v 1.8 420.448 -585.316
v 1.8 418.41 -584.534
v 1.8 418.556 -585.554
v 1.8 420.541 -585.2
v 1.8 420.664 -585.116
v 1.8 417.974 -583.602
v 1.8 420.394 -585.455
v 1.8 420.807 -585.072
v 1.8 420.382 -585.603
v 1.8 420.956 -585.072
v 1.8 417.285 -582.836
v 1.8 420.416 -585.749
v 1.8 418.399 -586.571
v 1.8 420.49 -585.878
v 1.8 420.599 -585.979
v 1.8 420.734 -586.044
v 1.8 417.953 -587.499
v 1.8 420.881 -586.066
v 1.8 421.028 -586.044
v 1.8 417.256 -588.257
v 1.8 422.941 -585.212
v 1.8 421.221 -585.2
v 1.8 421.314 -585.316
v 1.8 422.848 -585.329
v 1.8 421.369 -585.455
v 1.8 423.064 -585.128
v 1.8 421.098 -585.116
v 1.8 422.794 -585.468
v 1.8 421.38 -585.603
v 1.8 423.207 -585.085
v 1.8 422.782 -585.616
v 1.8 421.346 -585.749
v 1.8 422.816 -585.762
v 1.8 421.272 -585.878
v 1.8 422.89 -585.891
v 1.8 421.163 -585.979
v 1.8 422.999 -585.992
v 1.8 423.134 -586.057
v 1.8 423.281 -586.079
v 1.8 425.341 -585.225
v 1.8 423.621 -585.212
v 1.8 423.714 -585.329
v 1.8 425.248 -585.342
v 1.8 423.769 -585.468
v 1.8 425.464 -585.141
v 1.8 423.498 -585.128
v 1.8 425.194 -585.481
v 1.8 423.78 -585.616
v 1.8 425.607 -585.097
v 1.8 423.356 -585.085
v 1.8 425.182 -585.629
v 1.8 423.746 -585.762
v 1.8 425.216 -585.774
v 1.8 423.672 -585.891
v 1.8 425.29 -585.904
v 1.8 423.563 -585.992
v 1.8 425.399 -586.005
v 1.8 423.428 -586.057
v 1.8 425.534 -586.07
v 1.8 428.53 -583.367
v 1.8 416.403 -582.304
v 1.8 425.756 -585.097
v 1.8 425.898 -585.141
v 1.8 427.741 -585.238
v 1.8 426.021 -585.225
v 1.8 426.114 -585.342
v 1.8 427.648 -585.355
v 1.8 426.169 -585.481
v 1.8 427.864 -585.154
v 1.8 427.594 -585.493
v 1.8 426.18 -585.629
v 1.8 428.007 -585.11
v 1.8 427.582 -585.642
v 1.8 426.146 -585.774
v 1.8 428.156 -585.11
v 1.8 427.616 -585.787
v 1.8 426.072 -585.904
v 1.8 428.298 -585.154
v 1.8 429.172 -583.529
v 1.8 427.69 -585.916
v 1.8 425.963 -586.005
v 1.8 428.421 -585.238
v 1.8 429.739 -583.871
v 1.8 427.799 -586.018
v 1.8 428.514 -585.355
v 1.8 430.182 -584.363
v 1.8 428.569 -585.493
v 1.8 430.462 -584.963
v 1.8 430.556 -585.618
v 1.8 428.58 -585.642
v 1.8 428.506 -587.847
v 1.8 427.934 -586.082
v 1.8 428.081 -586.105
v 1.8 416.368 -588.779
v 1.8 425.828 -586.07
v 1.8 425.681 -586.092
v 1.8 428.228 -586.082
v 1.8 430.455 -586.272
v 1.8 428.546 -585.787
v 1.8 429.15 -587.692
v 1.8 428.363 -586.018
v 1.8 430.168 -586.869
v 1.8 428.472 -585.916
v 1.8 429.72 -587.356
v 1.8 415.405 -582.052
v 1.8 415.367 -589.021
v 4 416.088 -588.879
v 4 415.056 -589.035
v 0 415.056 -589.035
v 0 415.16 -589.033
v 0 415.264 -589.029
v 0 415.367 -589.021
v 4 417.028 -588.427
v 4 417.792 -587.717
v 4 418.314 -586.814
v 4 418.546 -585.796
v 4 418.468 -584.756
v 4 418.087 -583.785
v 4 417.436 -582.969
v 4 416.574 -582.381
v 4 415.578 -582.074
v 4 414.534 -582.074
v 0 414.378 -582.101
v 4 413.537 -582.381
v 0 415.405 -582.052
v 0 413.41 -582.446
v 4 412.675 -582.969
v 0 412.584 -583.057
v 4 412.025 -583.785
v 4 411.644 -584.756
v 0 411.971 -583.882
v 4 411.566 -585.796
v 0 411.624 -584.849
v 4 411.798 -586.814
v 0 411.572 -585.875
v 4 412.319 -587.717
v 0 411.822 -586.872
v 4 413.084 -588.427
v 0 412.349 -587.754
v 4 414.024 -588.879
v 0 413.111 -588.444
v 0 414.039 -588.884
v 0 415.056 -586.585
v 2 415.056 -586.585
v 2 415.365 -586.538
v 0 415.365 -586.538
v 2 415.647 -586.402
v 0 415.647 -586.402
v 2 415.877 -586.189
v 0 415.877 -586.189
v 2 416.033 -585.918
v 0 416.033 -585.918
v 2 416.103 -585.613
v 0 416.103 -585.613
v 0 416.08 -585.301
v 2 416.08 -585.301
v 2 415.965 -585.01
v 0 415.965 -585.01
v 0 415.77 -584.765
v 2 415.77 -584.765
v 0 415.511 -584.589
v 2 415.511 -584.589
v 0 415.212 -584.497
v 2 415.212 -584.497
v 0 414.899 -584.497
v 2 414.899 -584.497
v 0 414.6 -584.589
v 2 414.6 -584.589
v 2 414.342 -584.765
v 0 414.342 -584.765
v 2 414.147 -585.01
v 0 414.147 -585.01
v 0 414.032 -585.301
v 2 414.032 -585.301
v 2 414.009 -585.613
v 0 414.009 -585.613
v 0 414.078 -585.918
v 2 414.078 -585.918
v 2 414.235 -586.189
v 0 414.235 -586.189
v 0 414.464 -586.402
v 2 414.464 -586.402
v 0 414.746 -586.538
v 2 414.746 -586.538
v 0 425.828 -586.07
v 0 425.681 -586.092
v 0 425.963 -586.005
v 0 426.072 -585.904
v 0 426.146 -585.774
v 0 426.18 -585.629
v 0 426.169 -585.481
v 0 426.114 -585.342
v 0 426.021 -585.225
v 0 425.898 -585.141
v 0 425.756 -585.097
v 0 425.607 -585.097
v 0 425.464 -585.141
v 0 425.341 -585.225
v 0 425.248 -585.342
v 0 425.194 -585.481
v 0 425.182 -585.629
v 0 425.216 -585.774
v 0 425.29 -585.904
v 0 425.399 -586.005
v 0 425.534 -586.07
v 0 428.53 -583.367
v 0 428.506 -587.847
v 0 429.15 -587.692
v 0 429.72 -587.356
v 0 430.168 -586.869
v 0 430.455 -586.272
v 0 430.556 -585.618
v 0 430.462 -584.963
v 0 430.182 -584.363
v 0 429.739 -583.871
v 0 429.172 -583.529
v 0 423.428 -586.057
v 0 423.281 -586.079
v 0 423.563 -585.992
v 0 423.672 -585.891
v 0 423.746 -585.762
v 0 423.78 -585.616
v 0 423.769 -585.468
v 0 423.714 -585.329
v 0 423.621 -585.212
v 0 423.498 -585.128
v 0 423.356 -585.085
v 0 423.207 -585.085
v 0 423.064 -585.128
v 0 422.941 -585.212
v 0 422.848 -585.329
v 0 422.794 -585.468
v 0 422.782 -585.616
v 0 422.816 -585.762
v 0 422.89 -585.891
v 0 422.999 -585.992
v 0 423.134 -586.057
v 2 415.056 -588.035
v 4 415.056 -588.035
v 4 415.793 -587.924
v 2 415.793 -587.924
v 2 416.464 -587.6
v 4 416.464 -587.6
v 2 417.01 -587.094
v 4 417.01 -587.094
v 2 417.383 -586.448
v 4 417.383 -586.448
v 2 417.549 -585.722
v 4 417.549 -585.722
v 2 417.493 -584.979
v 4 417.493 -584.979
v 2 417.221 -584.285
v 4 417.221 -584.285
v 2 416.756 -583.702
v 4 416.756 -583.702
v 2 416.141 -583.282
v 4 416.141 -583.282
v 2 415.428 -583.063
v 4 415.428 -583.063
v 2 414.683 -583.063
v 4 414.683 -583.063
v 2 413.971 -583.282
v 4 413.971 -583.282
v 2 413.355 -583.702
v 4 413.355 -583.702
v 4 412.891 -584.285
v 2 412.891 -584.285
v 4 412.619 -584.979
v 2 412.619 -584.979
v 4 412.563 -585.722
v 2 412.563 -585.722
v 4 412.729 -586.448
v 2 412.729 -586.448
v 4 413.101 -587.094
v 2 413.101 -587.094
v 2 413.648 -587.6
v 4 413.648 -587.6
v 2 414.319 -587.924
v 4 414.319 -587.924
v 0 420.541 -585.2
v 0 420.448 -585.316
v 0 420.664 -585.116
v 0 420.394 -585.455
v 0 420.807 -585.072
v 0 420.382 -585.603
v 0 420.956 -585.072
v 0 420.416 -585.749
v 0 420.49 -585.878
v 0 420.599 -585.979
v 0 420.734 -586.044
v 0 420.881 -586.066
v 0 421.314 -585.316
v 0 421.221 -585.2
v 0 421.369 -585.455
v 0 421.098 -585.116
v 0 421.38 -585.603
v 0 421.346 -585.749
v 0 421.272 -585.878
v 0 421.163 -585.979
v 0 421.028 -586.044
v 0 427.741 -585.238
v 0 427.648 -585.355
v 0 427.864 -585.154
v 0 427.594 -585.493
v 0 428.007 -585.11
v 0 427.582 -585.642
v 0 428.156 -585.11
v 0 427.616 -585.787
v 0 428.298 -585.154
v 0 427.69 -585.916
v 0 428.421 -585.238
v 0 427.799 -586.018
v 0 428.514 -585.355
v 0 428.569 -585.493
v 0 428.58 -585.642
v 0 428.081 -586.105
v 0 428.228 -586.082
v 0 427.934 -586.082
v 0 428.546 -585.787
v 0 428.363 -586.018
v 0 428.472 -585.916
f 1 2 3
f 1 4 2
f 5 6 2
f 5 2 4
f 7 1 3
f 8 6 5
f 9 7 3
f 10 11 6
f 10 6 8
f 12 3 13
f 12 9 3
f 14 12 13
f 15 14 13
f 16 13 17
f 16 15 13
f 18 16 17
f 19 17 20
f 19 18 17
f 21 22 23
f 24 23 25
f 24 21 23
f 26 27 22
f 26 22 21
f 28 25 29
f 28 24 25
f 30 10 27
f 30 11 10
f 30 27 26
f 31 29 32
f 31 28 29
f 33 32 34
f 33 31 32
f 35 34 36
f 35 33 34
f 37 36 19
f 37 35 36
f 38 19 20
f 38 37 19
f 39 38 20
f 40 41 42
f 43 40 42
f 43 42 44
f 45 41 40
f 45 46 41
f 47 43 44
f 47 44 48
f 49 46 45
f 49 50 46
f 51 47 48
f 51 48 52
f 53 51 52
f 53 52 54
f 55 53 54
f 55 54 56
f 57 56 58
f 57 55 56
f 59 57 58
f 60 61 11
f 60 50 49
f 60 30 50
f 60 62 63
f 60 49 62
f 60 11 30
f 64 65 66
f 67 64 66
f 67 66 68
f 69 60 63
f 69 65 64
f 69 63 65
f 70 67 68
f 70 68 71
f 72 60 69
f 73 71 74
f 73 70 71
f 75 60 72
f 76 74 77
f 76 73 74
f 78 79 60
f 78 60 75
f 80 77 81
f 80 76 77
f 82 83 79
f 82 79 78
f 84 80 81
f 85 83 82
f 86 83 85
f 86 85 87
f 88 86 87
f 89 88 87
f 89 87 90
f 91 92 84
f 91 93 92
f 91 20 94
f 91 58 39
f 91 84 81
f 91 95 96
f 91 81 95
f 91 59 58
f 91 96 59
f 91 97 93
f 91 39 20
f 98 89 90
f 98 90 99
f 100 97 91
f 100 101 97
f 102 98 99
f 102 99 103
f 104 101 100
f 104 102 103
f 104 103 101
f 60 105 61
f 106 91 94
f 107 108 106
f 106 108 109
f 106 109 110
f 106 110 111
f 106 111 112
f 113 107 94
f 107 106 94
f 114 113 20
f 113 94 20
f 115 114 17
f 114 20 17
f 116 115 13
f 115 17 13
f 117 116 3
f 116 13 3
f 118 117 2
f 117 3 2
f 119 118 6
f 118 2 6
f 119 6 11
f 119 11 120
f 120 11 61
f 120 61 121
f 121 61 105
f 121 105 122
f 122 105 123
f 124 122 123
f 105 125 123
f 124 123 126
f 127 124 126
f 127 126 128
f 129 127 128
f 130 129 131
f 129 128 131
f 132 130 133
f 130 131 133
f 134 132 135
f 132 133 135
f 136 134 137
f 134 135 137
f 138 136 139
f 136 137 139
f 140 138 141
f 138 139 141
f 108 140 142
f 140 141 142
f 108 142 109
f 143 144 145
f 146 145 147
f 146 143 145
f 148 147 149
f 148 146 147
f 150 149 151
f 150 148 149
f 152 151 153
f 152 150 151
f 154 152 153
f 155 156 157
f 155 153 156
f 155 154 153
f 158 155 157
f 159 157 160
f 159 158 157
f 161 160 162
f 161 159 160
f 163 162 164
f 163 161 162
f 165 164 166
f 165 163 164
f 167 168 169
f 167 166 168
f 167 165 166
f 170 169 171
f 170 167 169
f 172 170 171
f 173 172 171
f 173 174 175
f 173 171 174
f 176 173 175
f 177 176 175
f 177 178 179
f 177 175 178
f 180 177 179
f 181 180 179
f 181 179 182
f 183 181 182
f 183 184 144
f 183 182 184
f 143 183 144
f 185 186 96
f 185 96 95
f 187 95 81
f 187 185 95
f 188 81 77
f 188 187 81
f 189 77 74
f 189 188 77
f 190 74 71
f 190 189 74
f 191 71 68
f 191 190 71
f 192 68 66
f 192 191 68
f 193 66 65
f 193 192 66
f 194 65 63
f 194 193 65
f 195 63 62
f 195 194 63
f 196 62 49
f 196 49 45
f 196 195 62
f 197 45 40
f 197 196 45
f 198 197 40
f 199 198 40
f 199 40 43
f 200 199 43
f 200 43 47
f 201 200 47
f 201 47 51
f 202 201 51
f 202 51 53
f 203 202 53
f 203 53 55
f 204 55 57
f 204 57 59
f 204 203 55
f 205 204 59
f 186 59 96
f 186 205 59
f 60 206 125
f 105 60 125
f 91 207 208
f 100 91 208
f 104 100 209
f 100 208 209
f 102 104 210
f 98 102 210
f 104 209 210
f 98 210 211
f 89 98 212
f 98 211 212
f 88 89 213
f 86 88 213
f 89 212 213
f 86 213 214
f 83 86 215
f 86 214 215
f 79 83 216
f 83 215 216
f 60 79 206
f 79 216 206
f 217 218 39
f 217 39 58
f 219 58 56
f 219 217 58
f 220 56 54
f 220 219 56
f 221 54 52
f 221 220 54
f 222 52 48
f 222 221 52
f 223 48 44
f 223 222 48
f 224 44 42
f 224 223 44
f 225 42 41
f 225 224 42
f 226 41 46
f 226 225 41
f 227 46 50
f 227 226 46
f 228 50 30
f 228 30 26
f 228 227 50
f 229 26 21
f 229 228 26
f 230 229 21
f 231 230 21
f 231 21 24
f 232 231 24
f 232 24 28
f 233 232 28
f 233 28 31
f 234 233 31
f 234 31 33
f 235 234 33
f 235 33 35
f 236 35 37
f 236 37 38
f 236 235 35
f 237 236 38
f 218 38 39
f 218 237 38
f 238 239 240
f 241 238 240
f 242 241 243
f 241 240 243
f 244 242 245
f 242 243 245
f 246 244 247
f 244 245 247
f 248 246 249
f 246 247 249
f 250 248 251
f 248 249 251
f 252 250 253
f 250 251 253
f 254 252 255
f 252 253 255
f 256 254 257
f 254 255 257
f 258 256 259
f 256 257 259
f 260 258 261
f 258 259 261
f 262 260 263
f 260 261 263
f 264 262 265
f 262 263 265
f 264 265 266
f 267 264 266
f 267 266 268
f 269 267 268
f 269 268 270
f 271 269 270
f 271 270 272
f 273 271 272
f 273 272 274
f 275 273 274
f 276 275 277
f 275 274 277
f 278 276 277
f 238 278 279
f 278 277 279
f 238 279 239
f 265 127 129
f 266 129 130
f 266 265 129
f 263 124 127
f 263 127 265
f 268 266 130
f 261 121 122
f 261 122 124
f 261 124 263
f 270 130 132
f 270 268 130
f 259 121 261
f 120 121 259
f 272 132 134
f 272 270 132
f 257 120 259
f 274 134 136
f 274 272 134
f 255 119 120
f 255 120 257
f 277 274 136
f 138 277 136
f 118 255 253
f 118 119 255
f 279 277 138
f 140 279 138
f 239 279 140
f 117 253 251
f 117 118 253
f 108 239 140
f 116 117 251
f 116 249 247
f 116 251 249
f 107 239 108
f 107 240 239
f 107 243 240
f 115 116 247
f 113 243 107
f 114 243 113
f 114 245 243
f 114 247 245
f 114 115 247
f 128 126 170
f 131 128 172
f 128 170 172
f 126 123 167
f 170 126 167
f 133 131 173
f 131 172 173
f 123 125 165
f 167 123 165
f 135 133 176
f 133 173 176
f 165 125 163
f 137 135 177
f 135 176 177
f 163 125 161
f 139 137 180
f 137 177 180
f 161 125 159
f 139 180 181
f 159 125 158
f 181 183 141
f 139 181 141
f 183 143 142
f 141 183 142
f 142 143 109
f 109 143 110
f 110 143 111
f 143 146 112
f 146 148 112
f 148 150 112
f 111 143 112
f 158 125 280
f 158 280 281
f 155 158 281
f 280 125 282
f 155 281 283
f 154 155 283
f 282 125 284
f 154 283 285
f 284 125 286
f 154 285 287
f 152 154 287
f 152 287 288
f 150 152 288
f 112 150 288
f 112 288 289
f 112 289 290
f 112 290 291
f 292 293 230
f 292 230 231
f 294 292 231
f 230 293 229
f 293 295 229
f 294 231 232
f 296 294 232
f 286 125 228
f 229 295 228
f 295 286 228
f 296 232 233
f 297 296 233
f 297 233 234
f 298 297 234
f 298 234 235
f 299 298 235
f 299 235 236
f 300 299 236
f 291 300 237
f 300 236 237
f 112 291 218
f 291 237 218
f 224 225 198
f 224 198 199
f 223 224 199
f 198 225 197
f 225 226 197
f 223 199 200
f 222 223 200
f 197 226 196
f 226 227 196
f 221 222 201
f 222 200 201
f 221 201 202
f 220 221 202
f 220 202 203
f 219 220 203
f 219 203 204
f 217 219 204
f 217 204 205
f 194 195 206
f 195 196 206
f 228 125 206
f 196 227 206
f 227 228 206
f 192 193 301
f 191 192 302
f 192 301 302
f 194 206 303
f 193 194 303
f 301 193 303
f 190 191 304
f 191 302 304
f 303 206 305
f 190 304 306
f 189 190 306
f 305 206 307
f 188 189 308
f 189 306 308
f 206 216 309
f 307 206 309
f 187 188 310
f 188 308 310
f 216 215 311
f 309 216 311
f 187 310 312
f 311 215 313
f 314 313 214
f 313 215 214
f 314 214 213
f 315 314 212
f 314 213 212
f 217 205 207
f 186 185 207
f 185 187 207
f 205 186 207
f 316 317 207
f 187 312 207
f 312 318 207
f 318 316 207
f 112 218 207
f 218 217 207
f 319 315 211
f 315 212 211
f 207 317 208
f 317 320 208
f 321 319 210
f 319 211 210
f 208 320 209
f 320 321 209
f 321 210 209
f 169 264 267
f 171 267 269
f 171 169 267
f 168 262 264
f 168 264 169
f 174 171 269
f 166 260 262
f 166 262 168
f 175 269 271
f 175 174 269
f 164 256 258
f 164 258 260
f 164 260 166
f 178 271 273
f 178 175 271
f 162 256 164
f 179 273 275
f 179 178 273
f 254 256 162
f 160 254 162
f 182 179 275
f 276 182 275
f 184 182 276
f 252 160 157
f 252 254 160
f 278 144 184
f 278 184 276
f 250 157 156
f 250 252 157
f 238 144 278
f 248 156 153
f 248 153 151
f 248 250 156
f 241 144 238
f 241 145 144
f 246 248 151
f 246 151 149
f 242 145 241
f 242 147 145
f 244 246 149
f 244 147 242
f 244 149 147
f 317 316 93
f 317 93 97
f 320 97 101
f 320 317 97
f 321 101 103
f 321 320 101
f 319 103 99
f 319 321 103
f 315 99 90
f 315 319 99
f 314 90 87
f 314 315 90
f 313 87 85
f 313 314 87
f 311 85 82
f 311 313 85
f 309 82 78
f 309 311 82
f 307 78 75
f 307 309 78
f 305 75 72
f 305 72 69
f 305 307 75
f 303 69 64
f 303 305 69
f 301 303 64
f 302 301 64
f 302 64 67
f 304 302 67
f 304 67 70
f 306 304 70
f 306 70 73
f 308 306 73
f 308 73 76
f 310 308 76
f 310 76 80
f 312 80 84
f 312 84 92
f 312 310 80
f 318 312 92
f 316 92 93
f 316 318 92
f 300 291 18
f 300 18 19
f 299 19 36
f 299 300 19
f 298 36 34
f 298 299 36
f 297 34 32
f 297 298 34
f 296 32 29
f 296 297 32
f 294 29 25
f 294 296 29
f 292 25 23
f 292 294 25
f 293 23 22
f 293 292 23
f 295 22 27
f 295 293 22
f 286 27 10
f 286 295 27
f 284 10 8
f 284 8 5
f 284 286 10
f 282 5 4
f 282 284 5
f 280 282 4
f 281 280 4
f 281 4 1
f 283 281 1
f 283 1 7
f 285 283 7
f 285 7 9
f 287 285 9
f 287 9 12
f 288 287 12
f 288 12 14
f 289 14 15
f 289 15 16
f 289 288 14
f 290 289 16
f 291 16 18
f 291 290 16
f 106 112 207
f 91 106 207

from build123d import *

# Parameters (mm, degrees)
IZIM1_R                     = 1.05
Y_KSEKLIK_EKSTR_ZYON1_DEPTH = 4
IZIM1_5_R                   = 0.5
Y_KSEKLIK_EKSTR_ZYON2_DEPTH = 1.8
IZIM2_R                     = 2.5
KES_EKSTR_ZYON1_DEPTH       = 2


with BuildPart() as part:
    # Çizim1 → Yükseklik-Ekstrüzyon1 (new body)
    with BuildSketch(Plane(origin=(0, 0, 0), x_dir=(0, 0, -1), z_dir=(1, 0, 0))):
        with BuildLine():
            ThreePointArc((589.020937835, 415.367382833), (585.553599597, 418.555843854), (582.052256525, 415.40476232))
            ThreePointArc((582.052256525, 415.40476232), (585.360174488, 411.560254519), (589.034826128, 415.055894204))
            ThreePointArc((589.034826128, 415.055894204), (589.031352331, 415.211793251), (589.020937835, 415.367382833))
        make_face()
        with Locations((585.534826128, 415.055894204)):
            Circle(IZIM1_R, mode=Mode.SUBTRACT)
    extrude(amount=Y_KSEKLIK_EKSTR_ZYON1_DEPTH)

    # Çizim1<5> → Yükseklik-Ekstrüzyon2 (add)
    with BuildSketch(Plane(origin=(0, 0, 0), x_dir=(0, 0, -1), z_dir=(1, 0, 0))):
        with BuildLine():
            Line((583.367103568, 428.530198932), (582.052256525, 415.40476232))
            ThreePointArc((582.052256525, 415.40476232), (585.553599597, 418.555843854), (589.020937835, 415.367382833))
            Line((589.020937835, 415.367382833), (587.846970124, 428.506169262))
            ThreePointArc((587.846970124, 428.506169262), (585.617966971, 430.555894204), (583.367103568, 428.530198932))
        make_face()
        with Locations((585.566071769, 420.8810388)):
            Circle(IZIM1_5_R, mode=Mode.SUBTRACT)
        with Locations((585.57894519, 423.2810388)):
            Circle(IZIM1_5_R, mode=Mode.SUBTRACT)
        with Locations((585.591818611, 425.6810388)):
            Circle(IZIM1_5_R, mode=Mode.SUBTRACT)
        with Locations((585.604692031, 428.0810388)):
            Circle(IZIM1_5_R, mode=Mode.SUBTRACT)
    extrude(amount=Y_KSEKLIK_EKSTR_ZYON2_DEPTH)

    # Çizim2 → Kes-Ekstrüzyon1 (cut)
    with BuildSketch(Plane(origin=(4, 0, 0), x_dir=(0, 0, -1), z_dir=(1, 0, 0))):
        with Locations((585.534826128, 415.055894204)):
            Circle(IZIM2_R)
    extrude(amount=-KES_EKSTR_ZYON1_DEPTH, mode=Mode.SUBTRACT)


solid = part.part
